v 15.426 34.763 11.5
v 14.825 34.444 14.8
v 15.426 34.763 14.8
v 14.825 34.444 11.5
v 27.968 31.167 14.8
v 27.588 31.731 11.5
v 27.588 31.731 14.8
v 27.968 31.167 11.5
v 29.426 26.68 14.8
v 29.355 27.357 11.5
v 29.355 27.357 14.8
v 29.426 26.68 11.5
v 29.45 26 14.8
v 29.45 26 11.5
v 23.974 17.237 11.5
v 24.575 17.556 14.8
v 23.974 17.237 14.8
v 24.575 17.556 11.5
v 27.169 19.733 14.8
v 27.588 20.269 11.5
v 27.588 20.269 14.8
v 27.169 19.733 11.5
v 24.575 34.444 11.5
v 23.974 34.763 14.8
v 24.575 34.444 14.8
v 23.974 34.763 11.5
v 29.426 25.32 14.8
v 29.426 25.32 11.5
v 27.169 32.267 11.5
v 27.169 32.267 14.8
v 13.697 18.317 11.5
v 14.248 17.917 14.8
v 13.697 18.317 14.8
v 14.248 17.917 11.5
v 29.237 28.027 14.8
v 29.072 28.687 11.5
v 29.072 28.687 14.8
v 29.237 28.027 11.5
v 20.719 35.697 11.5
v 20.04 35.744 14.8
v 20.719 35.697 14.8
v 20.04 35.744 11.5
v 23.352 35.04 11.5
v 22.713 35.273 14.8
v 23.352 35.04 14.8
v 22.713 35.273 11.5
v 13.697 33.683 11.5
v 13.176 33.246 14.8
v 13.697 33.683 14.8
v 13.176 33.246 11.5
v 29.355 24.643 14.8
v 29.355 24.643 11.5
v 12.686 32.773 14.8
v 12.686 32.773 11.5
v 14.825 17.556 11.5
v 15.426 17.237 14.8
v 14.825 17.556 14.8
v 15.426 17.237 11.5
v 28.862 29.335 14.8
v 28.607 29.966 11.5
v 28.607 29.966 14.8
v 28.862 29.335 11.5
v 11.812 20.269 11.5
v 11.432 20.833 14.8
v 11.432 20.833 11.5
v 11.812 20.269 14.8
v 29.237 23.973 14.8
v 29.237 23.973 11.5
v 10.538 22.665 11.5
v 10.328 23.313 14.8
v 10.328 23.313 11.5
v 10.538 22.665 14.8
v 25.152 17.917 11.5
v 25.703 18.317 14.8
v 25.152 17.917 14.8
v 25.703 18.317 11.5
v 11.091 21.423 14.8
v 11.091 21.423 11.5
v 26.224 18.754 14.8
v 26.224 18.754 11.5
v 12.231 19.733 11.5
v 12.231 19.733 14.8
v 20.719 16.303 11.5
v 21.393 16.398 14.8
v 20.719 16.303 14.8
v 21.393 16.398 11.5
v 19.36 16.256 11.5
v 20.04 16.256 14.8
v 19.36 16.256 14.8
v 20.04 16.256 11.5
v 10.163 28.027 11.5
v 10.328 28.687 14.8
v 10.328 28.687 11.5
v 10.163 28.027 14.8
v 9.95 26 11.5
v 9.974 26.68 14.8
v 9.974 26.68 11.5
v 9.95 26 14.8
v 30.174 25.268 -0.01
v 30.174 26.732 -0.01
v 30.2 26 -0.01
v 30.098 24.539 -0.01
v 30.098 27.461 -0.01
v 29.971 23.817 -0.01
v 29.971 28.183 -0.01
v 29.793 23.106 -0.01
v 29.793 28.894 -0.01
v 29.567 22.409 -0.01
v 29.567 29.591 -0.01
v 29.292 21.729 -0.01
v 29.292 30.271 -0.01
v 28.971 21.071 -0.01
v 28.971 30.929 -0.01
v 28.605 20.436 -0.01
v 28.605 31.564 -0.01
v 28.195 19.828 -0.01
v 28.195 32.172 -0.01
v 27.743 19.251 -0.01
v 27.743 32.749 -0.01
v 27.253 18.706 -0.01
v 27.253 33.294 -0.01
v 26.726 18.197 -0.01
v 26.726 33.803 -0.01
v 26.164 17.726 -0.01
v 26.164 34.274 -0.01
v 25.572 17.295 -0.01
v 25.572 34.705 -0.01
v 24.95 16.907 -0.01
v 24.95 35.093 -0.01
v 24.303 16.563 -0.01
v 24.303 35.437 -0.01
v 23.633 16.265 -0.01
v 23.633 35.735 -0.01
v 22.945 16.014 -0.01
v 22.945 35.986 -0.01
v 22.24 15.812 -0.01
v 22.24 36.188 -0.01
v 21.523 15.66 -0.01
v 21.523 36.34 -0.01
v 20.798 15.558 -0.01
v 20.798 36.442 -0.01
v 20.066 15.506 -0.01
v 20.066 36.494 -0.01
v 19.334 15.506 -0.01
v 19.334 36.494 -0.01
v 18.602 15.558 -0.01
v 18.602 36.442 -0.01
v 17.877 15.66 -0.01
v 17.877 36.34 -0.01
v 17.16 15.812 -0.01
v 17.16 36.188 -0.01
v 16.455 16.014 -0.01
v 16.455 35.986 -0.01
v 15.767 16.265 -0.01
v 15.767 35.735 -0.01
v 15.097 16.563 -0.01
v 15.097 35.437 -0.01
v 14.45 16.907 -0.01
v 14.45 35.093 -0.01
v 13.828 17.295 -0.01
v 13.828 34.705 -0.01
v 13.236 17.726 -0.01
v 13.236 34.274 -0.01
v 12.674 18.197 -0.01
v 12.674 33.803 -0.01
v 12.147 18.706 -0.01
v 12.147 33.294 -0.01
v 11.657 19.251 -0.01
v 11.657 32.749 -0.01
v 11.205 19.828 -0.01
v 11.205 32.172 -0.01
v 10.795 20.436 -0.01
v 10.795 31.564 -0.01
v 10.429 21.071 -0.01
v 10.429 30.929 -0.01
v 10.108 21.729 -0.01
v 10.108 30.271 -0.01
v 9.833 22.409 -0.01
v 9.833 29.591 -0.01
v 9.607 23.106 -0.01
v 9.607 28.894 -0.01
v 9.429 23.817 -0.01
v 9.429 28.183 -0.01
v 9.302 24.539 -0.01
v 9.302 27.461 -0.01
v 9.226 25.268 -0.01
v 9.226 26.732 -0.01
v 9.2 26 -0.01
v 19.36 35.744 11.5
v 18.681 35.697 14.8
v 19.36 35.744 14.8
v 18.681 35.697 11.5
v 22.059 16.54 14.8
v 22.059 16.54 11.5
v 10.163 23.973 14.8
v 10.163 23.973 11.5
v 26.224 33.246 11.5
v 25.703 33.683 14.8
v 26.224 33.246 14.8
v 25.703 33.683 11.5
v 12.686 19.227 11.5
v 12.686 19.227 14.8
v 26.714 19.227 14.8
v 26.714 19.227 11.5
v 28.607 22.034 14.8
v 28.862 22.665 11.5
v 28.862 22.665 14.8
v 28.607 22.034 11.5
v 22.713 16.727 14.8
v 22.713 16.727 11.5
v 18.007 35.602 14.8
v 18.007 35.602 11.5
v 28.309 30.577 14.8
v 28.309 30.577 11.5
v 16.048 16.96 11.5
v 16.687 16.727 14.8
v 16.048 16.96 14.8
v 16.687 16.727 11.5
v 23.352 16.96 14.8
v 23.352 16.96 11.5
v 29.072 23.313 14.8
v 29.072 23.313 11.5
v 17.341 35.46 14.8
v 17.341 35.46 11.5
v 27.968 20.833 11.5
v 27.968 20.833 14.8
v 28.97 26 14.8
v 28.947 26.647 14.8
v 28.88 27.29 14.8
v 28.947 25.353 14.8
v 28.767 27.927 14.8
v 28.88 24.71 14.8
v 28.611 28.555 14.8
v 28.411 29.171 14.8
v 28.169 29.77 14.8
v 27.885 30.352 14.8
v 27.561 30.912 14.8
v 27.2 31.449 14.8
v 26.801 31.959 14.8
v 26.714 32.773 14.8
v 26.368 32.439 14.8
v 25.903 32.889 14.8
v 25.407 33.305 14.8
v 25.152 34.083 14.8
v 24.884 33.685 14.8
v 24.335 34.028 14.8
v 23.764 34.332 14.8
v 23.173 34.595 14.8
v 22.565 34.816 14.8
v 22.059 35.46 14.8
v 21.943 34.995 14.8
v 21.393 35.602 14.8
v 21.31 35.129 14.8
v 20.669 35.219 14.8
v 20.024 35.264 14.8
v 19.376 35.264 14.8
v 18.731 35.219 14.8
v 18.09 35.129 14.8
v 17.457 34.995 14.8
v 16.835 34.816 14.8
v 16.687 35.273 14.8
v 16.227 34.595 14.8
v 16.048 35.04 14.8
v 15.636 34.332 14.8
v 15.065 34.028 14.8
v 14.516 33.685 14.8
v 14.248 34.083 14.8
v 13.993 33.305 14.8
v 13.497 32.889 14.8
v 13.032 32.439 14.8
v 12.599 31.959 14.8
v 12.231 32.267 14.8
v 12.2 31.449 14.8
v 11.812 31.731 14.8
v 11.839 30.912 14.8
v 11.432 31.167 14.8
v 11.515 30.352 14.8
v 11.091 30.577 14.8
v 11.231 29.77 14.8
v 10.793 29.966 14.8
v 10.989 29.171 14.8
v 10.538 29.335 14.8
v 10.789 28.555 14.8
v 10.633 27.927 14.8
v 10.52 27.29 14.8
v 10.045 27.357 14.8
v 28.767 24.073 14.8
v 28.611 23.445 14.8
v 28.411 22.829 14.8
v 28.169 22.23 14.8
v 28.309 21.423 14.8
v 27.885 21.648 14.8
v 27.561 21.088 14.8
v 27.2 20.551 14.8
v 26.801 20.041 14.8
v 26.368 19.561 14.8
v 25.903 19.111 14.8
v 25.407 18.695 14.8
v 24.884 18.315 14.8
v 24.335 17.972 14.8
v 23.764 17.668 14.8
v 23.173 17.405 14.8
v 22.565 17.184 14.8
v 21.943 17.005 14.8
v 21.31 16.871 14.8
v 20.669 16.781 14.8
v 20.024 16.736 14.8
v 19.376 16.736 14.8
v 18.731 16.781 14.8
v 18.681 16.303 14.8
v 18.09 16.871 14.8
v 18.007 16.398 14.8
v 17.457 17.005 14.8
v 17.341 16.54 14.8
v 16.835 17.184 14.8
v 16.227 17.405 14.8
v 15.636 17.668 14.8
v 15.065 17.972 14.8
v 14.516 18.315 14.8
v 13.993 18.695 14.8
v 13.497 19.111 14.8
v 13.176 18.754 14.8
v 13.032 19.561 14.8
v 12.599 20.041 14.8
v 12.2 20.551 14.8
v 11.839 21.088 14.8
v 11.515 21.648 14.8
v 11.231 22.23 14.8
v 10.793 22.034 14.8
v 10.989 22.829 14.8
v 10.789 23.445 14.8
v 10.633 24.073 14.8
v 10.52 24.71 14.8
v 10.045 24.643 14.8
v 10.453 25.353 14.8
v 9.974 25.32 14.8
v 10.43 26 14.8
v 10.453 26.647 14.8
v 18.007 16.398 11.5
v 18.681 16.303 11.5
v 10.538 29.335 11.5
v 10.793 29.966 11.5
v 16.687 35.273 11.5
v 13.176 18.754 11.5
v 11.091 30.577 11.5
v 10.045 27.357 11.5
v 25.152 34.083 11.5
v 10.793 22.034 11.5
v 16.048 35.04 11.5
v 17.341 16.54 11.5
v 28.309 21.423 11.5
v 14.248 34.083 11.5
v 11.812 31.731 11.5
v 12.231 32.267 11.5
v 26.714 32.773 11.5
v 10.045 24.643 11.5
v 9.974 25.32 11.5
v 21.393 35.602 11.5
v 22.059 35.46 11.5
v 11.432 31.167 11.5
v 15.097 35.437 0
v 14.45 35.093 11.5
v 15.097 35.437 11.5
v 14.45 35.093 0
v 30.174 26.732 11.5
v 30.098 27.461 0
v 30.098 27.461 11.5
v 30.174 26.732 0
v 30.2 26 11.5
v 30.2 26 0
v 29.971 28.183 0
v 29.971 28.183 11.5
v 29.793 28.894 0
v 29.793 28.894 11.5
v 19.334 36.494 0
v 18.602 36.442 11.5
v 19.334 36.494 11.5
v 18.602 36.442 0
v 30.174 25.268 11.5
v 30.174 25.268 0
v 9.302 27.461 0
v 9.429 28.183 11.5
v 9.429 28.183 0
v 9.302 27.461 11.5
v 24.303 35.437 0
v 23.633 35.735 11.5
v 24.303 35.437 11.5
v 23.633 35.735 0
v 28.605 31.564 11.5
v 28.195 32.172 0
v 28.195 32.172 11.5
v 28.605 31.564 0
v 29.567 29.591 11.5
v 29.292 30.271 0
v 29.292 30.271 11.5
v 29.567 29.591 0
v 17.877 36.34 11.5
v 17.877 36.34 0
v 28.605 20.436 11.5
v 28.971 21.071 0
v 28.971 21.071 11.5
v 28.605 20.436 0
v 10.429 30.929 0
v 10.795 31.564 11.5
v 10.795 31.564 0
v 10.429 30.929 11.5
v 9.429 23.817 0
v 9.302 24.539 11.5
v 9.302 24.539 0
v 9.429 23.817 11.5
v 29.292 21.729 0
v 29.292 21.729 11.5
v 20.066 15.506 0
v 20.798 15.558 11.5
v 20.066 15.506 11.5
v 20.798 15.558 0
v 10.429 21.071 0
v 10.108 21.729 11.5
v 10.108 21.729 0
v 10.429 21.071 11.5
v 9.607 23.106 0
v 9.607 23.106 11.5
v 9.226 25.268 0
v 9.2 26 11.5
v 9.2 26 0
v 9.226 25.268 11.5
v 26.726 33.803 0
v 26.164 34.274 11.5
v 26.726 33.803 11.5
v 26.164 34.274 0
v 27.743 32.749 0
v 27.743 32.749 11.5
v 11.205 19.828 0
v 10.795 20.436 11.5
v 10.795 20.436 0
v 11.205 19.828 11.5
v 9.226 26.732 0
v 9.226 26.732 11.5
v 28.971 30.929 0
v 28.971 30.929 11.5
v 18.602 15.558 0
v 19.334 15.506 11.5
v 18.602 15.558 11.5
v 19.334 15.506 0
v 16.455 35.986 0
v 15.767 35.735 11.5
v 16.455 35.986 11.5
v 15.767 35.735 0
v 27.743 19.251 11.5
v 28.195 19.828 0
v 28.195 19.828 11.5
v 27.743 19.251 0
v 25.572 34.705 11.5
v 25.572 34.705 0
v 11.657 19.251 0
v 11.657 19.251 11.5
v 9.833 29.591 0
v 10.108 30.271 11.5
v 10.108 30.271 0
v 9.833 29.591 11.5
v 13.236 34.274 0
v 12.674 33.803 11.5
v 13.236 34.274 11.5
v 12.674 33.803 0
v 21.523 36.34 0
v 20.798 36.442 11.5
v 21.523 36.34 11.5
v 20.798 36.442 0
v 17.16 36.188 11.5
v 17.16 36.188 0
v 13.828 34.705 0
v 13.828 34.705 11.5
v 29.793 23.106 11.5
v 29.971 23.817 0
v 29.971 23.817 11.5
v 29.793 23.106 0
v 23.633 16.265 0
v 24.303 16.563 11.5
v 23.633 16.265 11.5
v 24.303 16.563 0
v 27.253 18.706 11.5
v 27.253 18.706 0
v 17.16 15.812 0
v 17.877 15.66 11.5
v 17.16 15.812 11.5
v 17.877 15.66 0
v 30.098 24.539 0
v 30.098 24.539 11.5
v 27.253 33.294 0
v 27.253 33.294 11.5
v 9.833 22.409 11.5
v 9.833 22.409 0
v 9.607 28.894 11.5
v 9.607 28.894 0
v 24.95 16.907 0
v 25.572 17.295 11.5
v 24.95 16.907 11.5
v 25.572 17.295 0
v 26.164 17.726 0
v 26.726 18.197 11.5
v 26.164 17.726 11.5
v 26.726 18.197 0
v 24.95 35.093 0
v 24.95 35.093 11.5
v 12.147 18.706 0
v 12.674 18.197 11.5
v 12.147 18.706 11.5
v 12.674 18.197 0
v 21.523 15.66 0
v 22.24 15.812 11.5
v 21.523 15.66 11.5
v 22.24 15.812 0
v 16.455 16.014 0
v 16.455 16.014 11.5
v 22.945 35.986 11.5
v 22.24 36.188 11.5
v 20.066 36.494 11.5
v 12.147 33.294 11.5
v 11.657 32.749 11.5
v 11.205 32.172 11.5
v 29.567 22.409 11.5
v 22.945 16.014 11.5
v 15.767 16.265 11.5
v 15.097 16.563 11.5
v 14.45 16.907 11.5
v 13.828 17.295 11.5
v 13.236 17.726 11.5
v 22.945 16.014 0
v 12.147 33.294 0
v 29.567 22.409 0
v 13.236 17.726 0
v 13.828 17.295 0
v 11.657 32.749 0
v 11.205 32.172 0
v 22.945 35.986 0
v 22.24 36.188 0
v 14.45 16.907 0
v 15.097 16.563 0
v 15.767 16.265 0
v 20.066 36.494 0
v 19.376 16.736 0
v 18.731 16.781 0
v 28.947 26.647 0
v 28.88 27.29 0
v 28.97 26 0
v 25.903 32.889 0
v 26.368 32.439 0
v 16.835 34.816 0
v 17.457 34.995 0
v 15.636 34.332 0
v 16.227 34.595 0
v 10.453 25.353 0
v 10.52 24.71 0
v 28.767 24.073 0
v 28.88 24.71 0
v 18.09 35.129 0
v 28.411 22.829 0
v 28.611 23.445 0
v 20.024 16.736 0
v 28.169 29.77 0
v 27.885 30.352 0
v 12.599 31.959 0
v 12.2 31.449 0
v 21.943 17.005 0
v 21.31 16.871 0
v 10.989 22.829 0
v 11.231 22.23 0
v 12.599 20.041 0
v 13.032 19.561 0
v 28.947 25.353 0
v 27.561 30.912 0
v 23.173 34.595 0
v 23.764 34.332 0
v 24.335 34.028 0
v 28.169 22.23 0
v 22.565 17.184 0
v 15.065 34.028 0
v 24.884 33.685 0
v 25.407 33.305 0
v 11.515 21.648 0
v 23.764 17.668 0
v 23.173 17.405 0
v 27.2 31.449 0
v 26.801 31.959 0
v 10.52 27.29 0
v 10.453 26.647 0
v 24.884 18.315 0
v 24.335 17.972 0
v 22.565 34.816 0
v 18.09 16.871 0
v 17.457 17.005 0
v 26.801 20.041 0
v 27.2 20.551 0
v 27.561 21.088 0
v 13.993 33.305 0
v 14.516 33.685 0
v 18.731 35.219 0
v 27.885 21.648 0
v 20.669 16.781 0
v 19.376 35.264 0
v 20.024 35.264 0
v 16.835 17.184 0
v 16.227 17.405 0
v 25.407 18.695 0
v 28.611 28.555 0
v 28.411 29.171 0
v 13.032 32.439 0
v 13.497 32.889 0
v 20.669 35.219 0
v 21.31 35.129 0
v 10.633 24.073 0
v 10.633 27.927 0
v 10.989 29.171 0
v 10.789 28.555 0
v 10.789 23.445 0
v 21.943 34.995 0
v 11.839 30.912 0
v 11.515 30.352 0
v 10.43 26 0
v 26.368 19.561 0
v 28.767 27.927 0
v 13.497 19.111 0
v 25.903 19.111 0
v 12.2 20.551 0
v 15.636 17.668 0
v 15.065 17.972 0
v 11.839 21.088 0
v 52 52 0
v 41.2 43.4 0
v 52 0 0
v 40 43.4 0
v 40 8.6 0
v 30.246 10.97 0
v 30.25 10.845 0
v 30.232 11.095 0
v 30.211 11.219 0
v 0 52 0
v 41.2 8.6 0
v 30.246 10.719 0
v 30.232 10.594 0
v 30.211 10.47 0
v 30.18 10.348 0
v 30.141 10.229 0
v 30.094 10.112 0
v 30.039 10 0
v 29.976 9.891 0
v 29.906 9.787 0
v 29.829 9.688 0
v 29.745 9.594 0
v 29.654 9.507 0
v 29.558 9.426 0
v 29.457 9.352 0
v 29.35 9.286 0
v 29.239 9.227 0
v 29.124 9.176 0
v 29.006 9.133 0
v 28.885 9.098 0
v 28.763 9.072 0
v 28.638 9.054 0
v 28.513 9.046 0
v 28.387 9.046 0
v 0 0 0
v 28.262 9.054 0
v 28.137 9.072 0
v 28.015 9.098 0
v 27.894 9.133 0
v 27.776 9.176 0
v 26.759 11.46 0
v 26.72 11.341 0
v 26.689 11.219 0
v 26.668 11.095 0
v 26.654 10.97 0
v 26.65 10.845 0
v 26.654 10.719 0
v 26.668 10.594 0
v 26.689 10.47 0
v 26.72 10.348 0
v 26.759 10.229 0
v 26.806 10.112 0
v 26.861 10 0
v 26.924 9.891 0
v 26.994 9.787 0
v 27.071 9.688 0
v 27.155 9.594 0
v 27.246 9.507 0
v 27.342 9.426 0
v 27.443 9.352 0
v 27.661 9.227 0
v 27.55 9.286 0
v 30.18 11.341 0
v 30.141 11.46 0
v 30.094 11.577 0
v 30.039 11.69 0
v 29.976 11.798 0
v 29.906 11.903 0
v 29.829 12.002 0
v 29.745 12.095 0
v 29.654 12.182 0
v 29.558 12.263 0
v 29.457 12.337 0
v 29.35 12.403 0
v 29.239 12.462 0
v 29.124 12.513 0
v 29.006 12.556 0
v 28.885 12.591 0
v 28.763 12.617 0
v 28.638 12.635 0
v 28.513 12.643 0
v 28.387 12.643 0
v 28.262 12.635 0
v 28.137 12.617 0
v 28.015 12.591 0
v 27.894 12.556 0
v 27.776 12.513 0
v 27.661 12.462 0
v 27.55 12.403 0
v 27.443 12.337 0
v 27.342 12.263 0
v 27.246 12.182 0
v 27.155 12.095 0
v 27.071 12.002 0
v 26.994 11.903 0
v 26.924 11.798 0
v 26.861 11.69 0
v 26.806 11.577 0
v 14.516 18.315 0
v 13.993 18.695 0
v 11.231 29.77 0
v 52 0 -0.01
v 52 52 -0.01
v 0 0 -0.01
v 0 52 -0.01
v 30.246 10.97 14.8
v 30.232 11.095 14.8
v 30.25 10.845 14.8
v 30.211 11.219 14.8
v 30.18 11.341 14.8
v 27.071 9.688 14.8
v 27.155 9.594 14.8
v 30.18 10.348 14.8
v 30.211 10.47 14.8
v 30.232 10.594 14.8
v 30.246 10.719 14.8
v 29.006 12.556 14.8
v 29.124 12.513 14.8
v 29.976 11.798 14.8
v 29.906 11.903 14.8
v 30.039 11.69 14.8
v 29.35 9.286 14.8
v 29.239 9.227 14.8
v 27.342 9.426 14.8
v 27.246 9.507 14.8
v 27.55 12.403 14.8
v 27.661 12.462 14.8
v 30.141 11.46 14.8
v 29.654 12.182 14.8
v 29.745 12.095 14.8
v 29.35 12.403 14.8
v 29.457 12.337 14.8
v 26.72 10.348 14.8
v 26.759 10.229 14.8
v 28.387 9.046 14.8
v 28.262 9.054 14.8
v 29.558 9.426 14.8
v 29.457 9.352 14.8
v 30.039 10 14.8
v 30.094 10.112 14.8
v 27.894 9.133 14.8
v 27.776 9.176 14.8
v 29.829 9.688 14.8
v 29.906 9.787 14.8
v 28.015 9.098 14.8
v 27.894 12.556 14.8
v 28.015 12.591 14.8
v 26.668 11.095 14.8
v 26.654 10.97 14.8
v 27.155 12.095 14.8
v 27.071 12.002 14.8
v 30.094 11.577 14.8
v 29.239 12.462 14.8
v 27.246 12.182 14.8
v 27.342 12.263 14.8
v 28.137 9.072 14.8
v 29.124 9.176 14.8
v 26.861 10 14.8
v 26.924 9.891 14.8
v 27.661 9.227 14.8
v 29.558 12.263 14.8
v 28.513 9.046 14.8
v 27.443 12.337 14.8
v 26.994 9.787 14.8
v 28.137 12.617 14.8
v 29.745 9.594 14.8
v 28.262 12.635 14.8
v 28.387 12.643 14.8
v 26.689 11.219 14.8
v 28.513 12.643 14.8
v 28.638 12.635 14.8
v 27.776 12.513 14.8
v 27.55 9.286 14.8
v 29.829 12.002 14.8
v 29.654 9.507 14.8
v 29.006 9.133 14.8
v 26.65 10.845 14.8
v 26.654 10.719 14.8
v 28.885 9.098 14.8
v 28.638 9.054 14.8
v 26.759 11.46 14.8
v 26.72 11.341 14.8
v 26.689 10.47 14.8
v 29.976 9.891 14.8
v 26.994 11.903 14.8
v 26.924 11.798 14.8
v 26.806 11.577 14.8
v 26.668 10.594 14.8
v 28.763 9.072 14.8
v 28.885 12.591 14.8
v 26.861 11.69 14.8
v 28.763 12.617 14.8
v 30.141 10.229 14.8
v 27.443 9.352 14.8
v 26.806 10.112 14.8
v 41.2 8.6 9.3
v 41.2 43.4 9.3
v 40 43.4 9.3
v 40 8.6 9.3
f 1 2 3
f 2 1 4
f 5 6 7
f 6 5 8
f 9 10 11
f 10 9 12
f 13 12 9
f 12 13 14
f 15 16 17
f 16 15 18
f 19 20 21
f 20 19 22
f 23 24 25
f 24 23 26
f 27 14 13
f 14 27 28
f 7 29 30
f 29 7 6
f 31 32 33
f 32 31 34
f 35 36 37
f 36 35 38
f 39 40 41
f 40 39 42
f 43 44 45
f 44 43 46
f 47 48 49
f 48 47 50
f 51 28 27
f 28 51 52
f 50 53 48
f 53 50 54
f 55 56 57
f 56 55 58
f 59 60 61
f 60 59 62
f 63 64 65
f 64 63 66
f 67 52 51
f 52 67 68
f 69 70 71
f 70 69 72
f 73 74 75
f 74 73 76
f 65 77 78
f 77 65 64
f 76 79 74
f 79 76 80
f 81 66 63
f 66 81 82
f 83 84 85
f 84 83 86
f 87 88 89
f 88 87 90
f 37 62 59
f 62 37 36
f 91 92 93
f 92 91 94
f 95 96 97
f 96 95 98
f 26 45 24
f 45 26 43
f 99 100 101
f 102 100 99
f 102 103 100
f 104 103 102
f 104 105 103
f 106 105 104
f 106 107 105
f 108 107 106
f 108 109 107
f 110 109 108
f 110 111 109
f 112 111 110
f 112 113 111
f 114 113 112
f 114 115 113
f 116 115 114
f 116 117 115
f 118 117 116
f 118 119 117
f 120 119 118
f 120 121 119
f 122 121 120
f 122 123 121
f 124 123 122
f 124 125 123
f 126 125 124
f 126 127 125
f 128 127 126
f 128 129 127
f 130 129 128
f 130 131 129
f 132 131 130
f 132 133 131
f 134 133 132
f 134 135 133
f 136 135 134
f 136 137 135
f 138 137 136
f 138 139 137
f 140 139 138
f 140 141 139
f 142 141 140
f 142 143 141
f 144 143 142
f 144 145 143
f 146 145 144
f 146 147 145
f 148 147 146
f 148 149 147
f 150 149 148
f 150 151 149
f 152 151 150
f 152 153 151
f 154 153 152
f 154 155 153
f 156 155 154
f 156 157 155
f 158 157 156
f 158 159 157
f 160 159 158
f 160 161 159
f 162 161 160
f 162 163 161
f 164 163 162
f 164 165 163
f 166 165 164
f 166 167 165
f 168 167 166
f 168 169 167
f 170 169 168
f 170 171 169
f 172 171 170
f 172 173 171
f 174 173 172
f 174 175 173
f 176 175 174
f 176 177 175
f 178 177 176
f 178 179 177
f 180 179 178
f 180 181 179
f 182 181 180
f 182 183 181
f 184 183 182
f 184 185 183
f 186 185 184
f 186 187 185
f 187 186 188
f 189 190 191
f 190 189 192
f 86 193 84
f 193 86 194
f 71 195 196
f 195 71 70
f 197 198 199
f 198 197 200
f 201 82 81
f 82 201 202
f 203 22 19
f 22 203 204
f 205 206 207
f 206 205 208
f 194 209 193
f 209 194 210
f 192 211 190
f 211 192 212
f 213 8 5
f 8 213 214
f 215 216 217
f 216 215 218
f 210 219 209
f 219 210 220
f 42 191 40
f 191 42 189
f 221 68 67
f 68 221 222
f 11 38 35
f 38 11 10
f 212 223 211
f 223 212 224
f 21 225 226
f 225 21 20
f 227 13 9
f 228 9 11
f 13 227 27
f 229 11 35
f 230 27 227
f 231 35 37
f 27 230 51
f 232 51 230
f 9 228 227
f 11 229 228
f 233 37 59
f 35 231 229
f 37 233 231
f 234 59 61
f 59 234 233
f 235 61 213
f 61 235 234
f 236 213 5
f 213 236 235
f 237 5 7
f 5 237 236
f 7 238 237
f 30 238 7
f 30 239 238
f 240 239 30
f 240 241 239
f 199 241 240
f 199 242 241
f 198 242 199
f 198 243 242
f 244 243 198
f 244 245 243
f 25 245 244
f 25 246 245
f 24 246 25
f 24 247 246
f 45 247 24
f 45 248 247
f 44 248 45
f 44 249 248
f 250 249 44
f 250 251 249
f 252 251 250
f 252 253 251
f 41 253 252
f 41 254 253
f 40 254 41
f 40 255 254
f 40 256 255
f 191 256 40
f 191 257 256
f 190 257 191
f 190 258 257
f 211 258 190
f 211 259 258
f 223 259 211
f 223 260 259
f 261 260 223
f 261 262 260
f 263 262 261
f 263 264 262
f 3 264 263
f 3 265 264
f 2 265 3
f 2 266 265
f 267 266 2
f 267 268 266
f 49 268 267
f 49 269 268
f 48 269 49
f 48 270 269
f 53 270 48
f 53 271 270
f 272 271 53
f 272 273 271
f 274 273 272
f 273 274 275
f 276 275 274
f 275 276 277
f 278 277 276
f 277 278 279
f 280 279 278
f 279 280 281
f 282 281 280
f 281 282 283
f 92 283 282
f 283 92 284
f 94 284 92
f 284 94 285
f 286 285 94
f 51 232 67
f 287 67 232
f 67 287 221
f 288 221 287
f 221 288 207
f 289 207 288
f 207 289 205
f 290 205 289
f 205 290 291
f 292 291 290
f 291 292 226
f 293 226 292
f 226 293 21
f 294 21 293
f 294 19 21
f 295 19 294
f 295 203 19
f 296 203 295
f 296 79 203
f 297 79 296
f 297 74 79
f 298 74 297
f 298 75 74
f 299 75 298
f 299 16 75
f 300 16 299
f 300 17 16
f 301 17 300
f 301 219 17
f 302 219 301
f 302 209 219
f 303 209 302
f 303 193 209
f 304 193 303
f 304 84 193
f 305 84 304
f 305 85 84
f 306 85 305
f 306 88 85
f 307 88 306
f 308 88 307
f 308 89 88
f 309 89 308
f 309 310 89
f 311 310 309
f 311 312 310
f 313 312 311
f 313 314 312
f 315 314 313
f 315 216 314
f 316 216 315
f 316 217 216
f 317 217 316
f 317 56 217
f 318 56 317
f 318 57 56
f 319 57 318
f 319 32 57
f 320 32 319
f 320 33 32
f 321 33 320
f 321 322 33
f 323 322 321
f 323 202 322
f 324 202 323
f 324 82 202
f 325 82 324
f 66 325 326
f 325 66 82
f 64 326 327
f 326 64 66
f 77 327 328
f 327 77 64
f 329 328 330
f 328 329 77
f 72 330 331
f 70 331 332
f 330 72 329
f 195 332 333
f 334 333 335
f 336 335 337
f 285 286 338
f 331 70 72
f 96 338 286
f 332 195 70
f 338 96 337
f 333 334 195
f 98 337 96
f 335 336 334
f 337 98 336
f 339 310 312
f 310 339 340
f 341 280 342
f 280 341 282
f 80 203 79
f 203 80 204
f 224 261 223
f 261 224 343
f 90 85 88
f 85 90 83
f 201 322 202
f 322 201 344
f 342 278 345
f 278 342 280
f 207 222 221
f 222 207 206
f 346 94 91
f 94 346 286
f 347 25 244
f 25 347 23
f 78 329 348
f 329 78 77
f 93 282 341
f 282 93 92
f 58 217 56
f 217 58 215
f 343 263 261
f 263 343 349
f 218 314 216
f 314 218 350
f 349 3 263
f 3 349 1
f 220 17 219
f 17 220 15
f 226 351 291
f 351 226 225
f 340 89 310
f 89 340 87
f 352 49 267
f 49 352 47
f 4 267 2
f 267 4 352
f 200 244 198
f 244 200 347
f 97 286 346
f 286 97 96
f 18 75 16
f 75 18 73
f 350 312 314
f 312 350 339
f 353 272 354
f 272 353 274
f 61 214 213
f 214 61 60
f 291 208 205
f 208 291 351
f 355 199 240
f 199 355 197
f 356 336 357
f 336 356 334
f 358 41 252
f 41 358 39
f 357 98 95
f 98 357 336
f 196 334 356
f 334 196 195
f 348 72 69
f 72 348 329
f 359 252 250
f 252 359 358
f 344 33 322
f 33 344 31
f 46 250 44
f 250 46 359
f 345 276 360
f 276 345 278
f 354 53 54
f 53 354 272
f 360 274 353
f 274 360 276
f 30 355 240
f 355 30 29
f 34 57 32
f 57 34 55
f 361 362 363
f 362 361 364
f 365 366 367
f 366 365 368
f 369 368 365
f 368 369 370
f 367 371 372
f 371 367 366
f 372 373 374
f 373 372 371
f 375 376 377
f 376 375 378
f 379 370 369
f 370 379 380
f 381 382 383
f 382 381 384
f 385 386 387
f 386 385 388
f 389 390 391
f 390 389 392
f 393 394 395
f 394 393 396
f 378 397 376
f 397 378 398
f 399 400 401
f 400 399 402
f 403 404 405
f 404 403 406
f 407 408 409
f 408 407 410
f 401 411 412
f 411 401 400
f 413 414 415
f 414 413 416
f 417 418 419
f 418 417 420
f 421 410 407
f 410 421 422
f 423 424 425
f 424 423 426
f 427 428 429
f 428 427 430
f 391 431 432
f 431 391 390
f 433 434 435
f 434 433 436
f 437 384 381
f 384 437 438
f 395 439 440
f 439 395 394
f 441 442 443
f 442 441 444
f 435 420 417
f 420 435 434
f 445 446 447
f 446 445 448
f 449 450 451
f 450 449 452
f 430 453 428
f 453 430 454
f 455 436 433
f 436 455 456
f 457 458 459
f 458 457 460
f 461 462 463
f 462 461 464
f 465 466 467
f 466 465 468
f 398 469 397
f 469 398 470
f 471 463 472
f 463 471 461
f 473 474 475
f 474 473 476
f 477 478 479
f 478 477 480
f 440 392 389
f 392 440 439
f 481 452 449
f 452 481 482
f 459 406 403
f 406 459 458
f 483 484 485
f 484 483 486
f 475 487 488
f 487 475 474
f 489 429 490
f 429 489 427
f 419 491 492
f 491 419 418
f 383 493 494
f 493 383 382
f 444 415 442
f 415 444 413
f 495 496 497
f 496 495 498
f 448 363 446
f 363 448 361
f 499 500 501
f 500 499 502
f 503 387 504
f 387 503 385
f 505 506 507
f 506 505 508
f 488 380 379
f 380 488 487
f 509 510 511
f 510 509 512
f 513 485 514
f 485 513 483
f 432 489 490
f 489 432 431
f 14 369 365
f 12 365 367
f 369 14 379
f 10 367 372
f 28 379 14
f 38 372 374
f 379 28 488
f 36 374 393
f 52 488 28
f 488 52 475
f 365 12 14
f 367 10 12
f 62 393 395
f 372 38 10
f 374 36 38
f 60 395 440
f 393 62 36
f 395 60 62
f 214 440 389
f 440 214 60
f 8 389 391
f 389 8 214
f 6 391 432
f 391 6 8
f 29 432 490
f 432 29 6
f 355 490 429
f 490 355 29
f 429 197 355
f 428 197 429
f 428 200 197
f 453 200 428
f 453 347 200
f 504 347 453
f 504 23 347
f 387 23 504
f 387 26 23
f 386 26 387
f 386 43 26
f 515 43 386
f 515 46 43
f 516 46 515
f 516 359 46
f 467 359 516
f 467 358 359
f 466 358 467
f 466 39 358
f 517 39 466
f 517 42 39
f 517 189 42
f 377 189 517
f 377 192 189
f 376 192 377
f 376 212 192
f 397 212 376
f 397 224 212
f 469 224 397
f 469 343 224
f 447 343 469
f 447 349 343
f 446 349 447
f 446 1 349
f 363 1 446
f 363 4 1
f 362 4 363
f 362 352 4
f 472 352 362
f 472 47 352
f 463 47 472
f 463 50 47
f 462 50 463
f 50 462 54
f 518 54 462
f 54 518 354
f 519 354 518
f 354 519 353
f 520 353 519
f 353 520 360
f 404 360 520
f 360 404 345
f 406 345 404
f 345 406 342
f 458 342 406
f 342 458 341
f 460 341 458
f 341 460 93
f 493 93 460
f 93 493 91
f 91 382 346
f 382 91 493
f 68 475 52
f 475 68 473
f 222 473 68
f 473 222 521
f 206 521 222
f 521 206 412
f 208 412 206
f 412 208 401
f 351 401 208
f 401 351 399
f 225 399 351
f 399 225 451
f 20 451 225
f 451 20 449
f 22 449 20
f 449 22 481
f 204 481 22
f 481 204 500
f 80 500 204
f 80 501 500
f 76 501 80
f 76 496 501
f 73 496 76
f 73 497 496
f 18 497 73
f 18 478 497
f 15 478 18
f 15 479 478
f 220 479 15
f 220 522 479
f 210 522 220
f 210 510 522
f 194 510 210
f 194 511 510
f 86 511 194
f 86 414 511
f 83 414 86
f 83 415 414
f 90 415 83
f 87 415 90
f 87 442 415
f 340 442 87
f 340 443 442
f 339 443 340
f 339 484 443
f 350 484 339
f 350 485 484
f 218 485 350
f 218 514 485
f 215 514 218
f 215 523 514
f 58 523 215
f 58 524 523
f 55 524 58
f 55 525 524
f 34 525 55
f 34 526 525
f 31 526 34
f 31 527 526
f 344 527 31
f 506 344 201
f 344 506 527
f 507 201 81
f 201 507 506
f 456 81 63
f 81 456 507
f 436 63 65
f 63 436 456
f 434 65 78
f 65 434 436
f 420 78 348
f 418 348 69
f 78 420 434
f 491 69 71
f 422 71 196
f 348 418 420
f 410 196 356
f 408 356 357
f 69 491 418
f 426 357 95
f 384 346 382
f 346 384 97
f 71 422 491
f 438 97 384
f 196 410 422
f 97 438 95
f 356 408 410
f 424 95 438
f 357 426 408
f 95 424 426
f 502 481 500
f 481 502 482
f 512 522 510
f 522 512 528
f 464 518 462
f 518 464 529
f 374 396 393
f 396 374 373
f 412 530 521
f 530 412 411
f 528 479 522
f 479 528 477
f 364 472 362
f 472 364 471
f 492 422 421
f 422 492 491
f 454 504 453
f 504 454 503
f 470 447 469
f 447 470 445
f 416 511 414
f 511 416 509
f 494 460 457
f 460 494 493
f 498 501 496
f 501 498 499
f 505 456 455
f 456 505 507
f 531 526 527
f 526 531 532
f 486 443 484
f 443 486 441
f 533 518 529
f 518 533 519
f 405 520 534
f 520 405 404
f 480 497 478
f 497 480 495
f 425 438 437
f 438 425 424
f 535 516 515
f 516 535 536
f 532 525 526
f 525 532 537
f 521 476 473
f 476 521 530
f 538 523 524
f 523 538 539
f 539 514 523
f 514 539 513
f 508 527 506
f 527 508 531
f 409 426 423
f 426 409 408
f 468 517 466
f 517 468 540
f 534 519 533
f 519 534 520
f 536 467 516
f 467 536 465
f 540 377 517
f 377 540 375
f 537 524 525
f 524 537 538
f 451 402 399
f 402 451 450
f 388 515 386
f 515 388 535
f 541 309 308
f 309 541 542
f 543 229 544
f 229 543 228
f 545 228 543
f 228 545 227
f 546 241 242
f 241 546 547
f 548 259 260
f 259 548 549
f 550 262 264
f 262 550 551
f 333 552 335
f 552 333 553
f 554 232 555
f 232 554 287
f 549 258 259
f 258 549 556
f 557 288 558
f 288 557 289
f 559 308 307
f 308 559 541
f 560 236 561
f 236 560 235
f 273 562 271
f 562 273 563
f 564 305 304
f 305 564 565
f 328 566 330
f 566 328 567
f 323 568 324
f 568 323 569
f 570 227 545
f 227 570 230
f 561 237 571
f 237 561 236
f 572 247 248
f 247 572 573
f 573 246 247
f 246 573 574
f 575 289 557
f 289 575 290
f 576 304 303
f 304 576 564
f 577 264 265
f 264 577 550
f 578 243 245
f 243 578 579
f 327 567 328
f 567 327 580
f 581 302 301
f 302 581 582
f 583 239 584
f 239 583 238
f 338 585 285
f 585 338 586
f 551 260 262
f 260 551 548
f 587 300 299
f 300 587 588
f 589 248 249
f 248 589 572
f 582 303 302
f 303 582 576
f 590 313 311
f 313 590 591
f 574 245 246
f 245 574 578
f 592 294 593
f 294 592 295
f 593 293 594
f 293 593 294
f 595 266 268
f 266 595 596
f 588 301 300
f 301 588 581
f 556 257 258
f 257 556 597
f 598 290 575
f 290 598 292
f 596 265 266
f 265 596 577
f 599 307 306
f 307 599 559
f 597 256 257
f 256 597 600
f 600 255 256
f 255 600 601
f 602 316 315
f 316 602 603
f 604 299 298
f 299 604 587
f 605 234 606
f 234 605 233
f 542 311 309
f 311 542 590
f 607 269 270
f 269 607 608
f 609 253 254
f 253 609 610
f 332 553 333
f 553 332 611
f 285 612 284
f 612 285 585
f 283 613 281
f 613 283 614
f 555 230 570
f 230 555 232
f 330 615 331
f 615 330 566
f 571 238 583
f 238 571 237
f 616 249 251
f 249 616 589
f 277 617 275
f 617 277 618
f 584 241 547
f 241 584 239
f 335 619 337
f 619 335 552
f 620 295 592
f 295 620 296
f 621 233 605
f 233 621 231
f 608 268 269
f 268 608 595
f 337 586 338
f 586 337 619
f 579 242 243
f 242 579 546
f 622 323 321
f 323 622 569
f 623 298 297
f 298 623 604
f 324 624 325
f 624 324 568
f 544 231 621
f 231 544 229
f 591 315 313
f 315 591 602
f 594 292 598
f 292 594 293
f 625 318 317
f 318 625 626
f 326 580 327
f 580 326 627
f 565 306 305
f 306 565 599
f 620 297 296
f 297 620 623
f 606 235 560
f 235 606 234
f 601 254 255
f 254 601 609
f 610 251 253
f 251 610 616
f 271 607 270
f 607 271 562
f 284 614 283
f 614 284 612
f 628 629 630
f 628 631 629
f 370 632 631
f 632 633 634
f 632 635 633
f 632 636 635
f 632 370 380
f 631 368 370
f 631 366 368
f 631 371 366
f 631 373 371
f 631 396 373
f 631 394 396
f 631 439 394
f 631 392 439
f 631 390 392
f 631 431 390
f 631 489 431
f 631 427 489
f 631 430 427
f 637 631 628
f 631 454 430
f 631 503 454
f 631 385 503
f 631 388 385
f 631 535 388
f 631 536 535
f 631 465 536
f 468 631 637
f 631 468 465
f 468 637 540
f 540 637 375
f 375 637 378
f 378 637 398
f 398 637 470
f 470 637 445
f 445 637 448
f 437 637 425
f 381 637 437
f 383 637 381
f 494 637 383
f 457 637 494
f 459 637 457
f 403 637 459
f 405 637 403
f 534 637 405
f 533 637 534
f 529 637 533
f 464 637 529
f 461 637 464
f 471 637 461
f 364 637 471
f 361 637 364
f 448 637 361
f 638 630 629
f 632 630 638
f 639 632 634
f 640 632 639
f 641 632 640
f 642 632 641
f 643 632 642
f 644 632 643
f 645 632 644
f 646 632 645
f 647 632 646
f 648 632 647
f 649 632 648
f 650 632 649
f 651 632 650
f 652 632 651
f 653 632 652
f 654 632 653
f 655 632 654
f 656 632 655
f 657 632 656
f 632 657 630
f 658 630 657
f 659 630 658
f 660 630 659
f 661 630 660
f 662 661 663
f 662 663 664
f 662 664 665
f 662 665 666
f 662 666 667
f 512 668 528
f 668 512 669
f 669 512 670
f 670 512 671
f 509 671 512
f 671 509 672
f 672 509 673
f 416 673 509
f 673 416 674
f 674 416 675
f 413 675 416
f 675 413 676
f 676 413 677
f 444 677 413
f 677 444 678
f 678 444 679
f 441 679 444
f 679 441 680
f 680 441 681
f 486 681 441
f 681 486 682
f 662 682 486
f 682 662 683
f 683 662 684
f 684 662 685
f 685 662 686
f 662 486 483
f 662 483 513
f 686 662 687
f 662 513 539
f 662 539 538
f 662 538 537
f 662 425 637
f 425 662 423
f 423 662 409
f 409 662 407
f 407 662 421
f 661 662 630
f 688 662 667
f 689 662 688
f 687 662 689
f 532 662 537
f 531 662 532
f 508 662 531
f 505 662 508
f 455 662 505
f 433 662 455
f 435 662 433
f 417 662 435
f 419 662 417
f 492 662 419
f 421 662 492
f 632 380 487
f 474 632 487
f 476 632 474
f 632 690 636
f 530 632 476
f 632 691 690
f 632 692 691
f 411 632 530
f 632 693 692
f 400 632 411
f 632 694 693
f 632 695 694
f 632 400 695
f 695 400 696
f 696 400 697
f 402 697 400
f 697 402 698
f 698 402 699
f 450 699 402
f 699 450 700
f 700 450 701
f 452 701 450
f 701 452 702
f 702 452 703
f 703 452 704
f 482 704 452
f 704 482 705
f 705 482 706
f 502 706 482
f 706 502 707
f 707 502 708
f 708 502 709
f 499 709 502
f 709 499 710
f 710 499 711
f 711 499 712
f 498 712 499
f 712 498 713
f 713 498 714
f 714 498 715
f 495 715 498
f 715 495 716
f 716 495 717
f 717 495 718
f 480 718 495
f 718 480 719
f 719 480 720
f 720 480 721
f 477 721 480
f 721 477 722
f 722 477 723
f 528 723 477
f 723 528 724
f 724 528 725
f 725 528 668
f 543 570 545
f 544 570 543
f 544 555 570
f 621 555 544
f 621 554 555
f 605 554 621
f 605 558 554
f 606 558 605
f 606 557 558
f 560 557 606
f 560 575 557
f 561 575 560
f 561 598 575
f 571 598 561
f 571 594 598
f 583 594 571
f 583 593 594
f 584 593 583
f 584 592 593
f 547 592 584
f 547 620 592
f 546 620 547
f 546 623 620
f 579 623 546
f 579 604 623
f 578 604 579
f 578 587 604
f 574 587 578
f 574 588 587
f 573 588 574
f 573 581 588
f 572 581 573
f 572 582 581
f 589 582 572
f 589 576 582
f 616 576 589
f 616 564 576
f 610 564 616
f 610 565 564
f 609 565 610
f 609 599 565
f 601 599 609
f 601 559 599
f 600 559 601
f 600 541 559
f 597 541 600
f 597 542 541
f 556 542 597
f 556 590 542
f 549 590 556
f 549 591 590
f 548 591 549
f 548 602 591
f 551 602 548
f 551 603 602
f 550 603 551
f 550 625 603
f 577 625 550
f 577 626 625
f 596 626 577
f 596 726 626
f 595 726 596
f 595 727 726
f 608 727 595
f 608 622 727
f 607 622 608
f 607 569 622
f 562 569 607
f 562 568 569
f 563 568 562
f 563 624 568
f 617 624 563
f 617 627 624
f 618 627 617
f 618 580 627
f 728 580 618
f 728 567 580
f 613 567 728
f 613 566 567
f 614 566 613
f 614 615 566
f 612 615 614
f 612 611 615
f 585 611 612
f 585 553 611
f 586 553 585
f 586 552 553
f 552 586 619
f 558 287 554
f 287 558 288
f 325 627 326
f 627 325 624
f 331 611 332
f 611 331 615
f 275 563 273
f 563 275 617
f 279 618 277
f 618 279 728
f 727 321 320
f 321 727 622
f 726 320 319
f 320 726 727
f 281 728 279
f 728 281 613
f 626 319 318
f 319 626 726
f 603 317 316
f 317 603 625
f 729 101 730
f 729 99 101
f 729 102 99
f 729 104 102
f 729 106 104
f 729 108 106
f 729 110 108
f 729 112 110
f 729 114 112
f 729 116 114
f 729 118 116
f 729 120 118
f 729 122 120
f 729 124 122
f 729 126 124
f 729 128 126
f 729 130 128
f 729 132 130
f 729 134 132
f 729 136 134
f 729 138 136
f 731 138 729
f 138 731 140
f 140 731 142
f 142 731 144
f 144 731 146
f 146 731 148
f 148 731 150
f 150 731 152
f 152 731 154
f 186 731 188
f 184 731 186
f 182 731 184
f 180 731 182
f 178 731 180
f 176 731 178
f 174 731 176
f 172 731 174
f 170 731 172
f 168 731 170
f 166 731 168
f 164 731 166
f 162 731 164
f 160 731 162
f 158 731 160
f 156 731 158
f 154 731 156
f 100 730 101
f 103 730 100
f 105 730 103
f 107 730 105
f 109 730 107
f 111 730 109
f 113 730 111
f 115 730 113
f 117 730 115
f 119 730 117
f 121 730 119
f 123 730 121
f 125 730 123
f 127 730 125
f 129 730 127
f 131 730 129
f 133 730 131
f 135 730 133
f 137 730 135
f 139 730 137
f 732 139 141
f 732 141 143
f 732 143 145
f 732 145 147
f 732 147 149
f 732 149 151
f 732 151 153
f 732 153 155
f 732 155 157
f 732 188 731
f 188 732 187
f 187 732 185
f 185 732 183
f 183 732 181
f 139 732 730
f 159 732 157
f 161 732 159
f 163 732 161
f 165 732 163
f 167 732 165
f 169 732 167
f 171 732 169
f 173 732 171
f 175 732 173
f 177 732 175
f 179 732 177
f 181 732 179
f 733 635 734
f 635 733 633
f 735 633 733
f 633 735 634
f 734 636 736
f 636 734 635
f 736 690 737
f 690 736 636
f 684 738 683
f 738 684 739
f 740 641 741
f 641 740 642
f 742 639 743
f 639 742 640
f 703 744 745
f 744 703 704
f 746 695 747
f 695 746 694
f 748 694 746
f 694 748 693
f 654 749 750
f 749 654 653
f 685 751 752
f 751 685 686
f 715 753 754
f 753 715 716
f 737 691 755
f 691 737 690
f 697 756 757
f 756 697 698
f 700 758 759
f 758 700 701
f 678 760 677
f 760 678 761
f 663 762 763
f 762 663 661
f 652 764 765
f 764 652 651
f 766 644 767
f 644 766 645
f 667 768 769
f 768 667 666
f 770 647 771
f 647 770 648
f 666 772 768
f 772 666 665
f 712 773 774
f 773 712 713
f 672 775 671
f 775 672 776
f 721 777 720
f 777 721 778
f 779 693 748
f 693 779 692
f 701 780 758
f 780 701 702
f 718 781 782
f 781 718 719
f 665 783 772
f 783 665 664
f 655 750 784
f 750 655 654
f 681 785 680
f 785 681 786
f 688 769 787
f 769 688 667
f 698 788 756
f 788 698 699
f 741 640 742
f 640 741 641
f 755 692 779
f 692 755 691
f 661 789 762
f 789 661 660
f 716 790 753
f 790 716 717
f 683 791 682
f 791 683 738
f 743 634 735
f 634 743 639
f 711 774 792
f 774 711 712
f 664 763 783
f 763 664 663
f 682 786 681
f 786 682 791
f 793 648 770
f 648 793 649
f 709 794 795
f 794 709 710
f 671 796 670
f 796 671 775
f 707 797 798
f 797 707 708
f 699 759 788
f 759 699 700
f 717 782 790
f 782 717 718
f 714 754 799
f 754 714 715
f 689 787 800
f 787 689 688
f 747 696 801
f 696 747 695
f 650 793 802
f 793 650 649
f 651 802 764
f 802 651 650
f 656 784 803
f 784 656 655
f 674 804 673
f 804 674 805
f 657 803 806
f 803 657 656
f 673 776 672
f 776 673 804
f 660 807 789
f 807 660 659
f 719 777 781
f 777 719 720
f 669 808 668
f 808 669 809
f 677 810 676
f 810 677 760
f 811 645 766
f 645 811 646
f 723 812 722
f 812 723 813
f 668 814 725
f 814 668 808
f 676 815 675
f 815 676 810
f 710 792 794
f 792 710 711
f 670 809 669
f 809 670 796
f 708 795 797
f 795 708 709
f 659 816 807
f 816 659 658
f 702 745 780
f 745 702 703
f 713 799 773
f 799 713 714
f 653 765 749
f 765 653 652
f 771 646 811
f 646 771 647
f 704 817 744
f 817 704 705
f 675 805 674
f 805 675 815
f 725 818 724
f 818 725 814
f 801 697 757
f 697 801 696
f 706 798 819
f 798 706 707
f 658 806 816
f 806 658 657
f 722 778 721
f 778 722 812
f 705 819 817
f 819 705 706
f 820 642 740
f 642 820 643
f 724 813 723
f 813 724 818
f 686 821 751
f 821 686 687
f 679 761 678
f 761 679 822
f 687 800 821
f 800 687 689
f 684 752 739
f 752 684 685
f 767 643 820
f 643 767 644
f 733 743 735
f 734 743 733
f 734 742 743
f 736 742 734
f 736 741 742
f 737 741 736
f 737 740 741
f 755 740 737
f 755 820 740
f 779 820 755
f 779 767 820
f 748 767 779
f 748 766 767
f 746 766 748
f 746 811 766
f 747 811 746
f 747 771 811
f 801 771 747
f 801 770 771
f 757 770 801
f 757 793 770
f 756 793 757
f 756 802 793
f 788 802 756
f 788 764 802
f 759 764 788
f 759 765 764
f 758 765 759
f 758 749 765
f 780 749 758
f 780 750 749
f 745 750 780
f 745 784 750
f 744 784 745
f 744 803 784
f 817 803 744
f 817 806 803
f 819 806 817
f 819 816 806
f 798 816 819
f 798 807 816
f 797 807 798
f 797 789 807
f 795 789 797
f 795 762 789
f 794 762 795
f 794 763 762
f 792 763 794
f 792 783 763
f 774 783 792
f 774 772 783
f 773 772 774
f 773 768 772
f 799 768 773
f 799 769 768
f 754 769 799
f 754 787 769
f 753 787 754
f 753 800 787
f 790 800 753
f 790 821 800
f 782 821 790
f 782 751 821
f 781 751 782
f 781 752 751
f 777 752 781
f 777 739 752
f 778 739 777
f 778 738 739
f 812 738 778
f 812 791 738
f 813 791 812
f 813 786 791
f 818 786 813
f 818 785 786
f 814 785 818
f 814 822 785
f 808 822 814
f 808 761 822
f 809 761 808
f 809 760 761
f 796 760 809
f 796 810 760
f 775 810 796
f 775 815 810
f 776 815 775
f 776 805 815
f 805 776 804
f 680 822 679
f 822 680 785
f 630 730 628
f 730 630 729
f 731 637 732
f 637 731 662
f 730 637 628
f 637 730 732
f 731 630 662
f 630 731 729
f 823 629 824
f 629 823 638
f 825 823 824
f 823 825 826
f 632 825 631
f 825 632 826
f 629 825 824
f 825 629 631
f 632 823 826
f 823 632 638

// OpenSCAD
// file: ../Base/PlacementOptions.scad
// Fischertechnik Box Foundation
// Placement Options

// Alignment
NoAlign = 0;
AlignLeft = 1;
AlignBottom = 2;
AlignCenter = 3;
AlignRight = 4;
AlignTop = 5;

// Element rotation degree steps
rotations = [0, -90, -180, -270];

// Rotation
NoRotation = 0;
Rotate0 = 0;
Rotate90 = 1;
Rotate180 = 2;
Rotate270 = 3;

// Docking (seen from above)
NoDock = -1;
DockLeft = 0;
DockTop = 1;
DockRight = 2;
DockCorner = 2;
DockBottom = 3;

// Web corners
LowerLeft = 0;
UpperLeft = 1;
UpperRight = 2;
LowerRight = 3;

// Web position relative to corner
LeftOfCorner = 0;
RightOfCorner = 1;
// file: ../Base/Boxes.scad
// Fischertechnik Box Foundation
// Pre-designed Boxes

use <Constants.scad>

include <PlacementOptions.scad>

box190Width = 190;
box190Depth = 130;
box130Width = 130;
box130Depth = 95;
boxUsageHeight = 33.9;
boxWallThickness = 2.4;
boxBaseThickness = 1.0;
boxWebWidth = 3.0;

// getBoxWallThickness()
// Gets the wall thickness of a Fischertechnik Box

function getBoxWallThickness() = boxWallThickness;

// Gets the usable height of a fischertechnik box
function getBoxUsageHeight() = boxUsageHeight;

// Gets the thickness of the Fischertechnik box base.
function getBoxBaseThickness() = boxBaseThickness;

// Gets the width of a box web
function getBoxWebWidth() = boxWebWidth;

// Gets the usable inner space of a Box 190 as an x/y-list
function getBox190Space() = [
    box190Width - 2*getBoxWallThickness(), 
    box190Depth - 2*getBoxWallThickness() ];

// Imports the Fischertechnik empty box 130x190 mm and places it at position 0,0
// 190x130 are the outer sizes, the inner space is slightly smaller. Use getBox190Space() to get the inner sizes.
// This module needs the STL file "Fischertechnik Box 130x190.stl" in the library path.
// The box is positioned that the usable inner space is at the 0,0,0 position. The

module Box190() {
    translate([-getBoxWallThickness(),-getBoxWallThickness(),-getBoxBaseThickness()])
        import("Fischertechnik Box 130x190.stl", convexity=3);
}

// Gets the usable inner space of a Box 130 as an x/y-list
function getBox130Space() = [
    box130Width - 2*getBoxWallThickness(), 
    box130Depth - 2*getBoxWallThickness() ];

// Imports the Fischertechnik empty box 95x130 mm and places it at position 0,0
// 190x130 are the outer sizes, the inner space is slightly smaller. Use getBox190Space() to get the inner sizes.
// This module needs the STL file "Fischertechnik Box 95x130.stl" in the library path.
// The box is positioned that the usable inner space is at the 0,0,0 position. The

module Box130() {
    translate([-getBoxWallThickness(),-getBoxWallThickness(),-getBoxBaseThickness()])
        import("Fischertechnik Box 95x130.stl", convexity=3);
}

// Creates a web at the specified box walls
// corner 0 = LowerLeft, 1 = UpperLeft, 2 = UpperRight, 3 = LowerRight
// side 0 = LeftOfCorner, 1 = RightOfCorner
// distance = Distance in mm from the corner
// box = inner width and depth of the box (default: Box 190)
// webWidth = length of the web (default is 3 mms)
// webThickness = thickness of the web (default is 1 mm)

module BoxWeb(corner, side, distance, box=getBox190Space(), webWidth=getBoxWebWidth(), webThickness=1.0) {
    sink = getBoxWallThickness()/2;

    width = (corner % 2 == 0) ? 
            (side == LeftOfCorner ? webWidth : webThickness) :
            (side == LeftOfCorner ? webThickness : webWidth);

    depth = (corner % 2 == 0) ? 
            (side == RightOfCorner ? webWidth : webThickness) :
            (side == RightOfCorner ? webThickness : webWidth);
    
    xDiff = corner == LowerLeft ? 
                (side == LeftOfCorner ? -sink : distance) :
            (corner == UpperLeft ?                
                (side == LeftOfCorner ? distance : -sink) :
            (corner == UpperRight ?
                (side == LeftOfCorner ? box.x-webWidth+sink : box.x-distance-webThickness) :
                (side == LeftOfCorner ? box.x-distance-webThickness: box.x-webWidth+sink)));

    yDiff = corner == LowerLeft ? 
                (side == RightOfCorner ? -sink : distance) :
            (corner == UpperLeft ?
                (side == RightOfCorner ? box.y-distance : box.y-webWidth+sink) :
            (corner == UpperRight ?
                (side == RightOfCorner ? box.y-webWidth+sink : box.y-distance) :
                (side == RightOfCorner ? distance : -sink)));
    
    translate([xDiff, yDiff, -getExcess()])
        cube([width, depth, boxUsageHeight + 2*getExcess()]);
}
// file: ../Base/Rotation.scad
// Fischertechnik Box Foundation
// Geometry Helpers Rotation

include <PlacementOptions.scad>

// getRotatedSpace(space, rotation=NoRotation)
// Rotates the space dependent on the specified rotation

function getRotatedSpace(space, rotation=NoRotation) = [
    (rotation == Rotate90 || rotation == Rotate270) ? space.y : space.x,
    (rotation == Rotate90 || rotation == Rotate270) ? space.x : space.y
];

// Rotates the given space around the fixed left lower corner
// space = the space the children needs as width/depth list [width,depth]
// rotation = 0 Rotate0 degrees, 1 Rotate90 degrees, 2 Rotate180 degrees, 3 Rotate270 degrees (equivalent to -90)

module RotateFix(space, rotation=NoRotation) {
    dy = (rotation == Rotate0 || rotation == Rotate270) ? 0 :
        (rotation == Rotate90) ? space.x :
        space.y;
    dx = (rotation < Rotate180) ? 0 :
        (rotation == Rotate180) ? space.x :
        space.y;
    
    translate([dx, dy, 0])
        rotate([0, 0, rotations[rotation]])
            children();
}
// file: ../Base/Alignment.scad
// Fischertechnik Box Foundation
// Geometry Helpers Alignment

include <PlacementOptions.scad>

// getAlignedX(elementWidth, spaceWidth, align=AlignRight, offset=0)
// Gets the aligned X offset of an element with the given
// width in the given space.
// elementWidth = The width of the element to positon
// spaceWidth = The space where the element should be aligned
// align = 0 AlignLeft, 1 AlignCenter, 2 AlignRight
// offset = an optional offset from the aligned position. When
// aligned left or centered, then positive values are in X direction.
// When aligned right then positive values are in negative X direction.

function getAlignedX(elementWidth, spaceWidth, align=AlignRight, offset=0) =
    (align == AlignLeft) ?
        offset :
        ((align == AlignCenter) ?
        (spaceWidth - elementWidth)/2 + offset :
        spaceWidth - offset - elementWidth);

// getAlignedY(elementDepth, spaceDepth, align=AlignTop, offset=0)
// Gets the aligned Y offset of an element with the given
// depth in the given space.
// elementDepth = The depth of the element to positon
// spaceDepth = The space where the element should be aligned
// align = 0 AlignBottom, 1 AlignCenter, 2 AlignTop
// offset = an optional offset from the aligned position. When
// aligned bottom or centered, then positive values are in Y direction.
// When aligned top then positive values are in negative Y direction.

function getAlignedY(elementDepth, spaceDepth, align=AlignTop, offset=0) =
    (align == AlignBottom) ?
        offset :
        ((align == AlignCenter) ?
        (spaceDepth - elementDepth)/2 + offset :
        spaceDepth - offset - elementDepth);
// file: CylinderGearZ20.scad
// Fischertechnik Box Library
// Cylinder for Gear Z20
// 31021

use <../Base/Constants.scad>
use <../Base/Placement.scad>
use <../ModelBase/Simple.scad>

depth = 33.8;
width = 33.8;
height = 14.8;
levelHeight = 11.5;

function getCylinderGearZ20Height() = height;
function getCylinderGearZ20LevelHeight() = levelHeight;

// getCylinderGearZ20Space()
// Gets the space the cylinder gear needs as width and depth (.x and .y as a list)

function getCylinderGearZ20Space() = [width, depth];

// CylinderGear()
// Standing cylinder for gear wheel Z20

module CylinderGearZ20() {
    diameter = getHubRingDiameter();
    levelDiameter = getHubRingLevelDiameter();

    Space(getCylinderGearZ20Space());
        
    Center(getCylinderGearZ20Space())
        LeveledTube(getCylinderGearZ20Height(), diameter, getCylinderGearZ20LevelHeight(), levelDiameter);
}

// Tests
color("lightgray")
CylinderGearZ20();
// file: ../Base/Placement.scad
// Fischertechnik Box Foundation
// Geometry Helpers Placement

use <Constants.scad>
use <Alignment.scad>
use <Rotation.scad>
use <Boxes.scad>

include <PlacementOptions.scad>

// Place(x=0, y=0, elementSpace=[0,0], alignX=AlignLeft, alignY=AlignBottom, rotation=Rotate0, boxSpace=getBox190Space())
// Places the child at the specified position
// y = Y-Position. This is a relative position when an X aligment is specified.
// x = X-Position. This is a relative position when an Y aligment is specified.
// elementSpace = space of the element to be placed [x,y]
// alignX = -1=NoAlign, 0 AlignLeft, 1 AlignCenter, 3 AlignRight (elementSpace and boxSpace required!)
// alignY = -1=NoAlign, 2 AlignBottom, 1 AlignCenter, 4 AlignTop (elementSpace and boxSpace required!)
// rotation = 0 Rotate0 0 degrees, 1 Rotate90 90 degrees, 
// 2 Rotate180 180 degrees, 3 Rotate270 270 degrees (equivalent to -90)
// boxSpace = Inner space of the box where the placement occurs [x,y] - default is Box 190x130 inner space

module Place(x=0, y=0, elementSpace=[0,0], 
  alignX=AlignLeft, alignY=AlignBottom, 
  rotation=NoRotation, boxSpace=getBox190Space()) {

    module Position(x, y, space, rotation=Rotate0) {
        translate([x, y, 0])
            RotateFix(space, rotation)
                children();
    }

    space = getRotatedSpace(elementSpace, rotation);
    alignedX = getAlignedX(space.x, boxSpace.x, alignX, x);
    alignedY = getAlignedY(space.y, boxSpace.y, alignY, y);
    Position(alignedX, alignedY, elementSpace, rotation)
        children();
}

// Center(space=getBox130Space(), elementSpace=[0,0])
// space = Space where the children is centered. For cylinder use centered=true and no elementSpace.
// elementSpace = space of the element to be centered [x,y]

module Center(space=getBox190Space(), elementSpace=[0,0]) {
    translate([(space.x - elementSpace.x) / 2, (space.y - elementSpace.y) / 2])
        children(0);
}

// CenterHorizontal(width=0, y=0, offset=0, space=getBox130Space())
// space = Space where the children is centered. For cylinder use centered=true and no elementSpace.
// elementSpace = space of the element to be centered [x,y]

module CenterHorizontal(width=0, y=0, offset=0, space=getBox190Space()) {
    translate([(space.x - width) / 2 + offset, y])
        children(0);
}

// CenterVertical(depth=0, x=0, offset=0, space=getBox130Space())
// space = Space where the children is centered. For cylinder use centered=true and no elementSpace.
// elementSpace = space of the element to be centered [x,y]

module CenterVertical(depth=0, x=0, offset=0, space=getBox190Space()) {
    translate([x, (space.y - depth) / 2 + offset])
        children(0);
}
// file: ../Base/Constants.scad
// Fischertechnik Box Foundation
// Constants

// Constant values necessary for multiple elements

// Base constants
dividerThickness = 1.2;
excess = 0.01;
fragments = 90;
tolerance = 0.8;

// Gets the thickness of a divider 
function getDividerThickness() = dividerThickness;

// Gets the excess that is used to merge walls into each other
function getExcess() = excess;

// Gets amount of fragments of a cylinder
function getFragments() = fragments;

// Gets the inner tolerance of a frame to each side
function getTolerance() = tolerance;


// Fischertechnik specific constants
axisDiameter = 4;
axisBottomDiameter = axisDiameter + 1;
axisTolerance = 0.2;
axisLockingLength = 8;

// Gets axis diameter of Fischertechnik axis
function getAxisDiameter() = axisDiameter;

// Gets axis diameter tolerance (subtracted for element axis)
function getAxisTolerance() = axisTolerance;

// Gets the axis diameter for standing axis
function getStandAxisDiameter() = getAxisDiameter() - getAxisTolerance();

// Gets axis bottom diameter for thicker part at the bottom
function getAxisBottomDiameter() = axisBottomDiameter;

// Gets the lengthh of the locking part of a locking axis
function getAxisLockingLength() = axisLockingLength;

// Studs

studHeight = 2.5;
studTolerance = 0.2;
studRailDistance = 9;   // as in ft 50

// gets the height of a connecting stud
function getStudHeight() = studHeight;

// gets the connecting stud height tolerance
function getStudTolerance() = studTolerance;

// gets the default rail distance for studs
function getStudRailDistance() = studRailDistance;

// Dockable Frame with Edge

standardEdgeDistance = 2.5;
standardWebDistance = 11.5;
standardCornerLength = 15;

// gets the standard distance to the wall of the box for dockable frames with webs
function getStandardEdgeDistance() = standardEdgeDistance;

// gets the standard distance of each web to the corner of the dockable frame
function getStandardWebDistance() = standardWebDistance;

// gets the standard length of the corner walls of a dockable frame
function getStandardCornerLength() = standardCornerLength;

// Tubes

tubeWallFactor = 0.8;

// gets the wall thickness of a tube.
function getTubeWallThickness() = tubeWallFactor * getDividerThickness();

// Small Parts and Divider Frame

smallPartsFrameHeight = 20;

// gets the frame height for docked small parts boxes.
function getSmallPartsFrameHeight() = smallPartsFrameHeight;

// Hubs

hubRingDiameter = 19.5;
hubRingLevelDiameter = 21;

// gets the diameter of a tube matching the inner ring of a wheel
function getHubRingDiameter() = hubRingDiameter;

// gets the diameter of a hub tube with a thicker diameter
function getHubRingLevelDiameter() = hubRingLevelDiameter;

// Struts

strutAddLength = 9.0;
strutDepth = 8.0;
strutThickness = 2.8;
strutOuterTolerance = 0.6;

// gets the full length of a strut (nominal length plus 2x radius at the ends)
function getFullStrutLength(length) = length + strutAddLength;

// gets the radius of the end of a strut
function getStrutEndRadius() = strutAddLength / 2;

// gets the the depth (width) of a strut
function getStrutDepth() = strutDepth;

// gets the the thickness of a strut
function getStrutThickness() = strutThickness;

// gets the tolerance added to the strut sizes for strut holders
function getStrutOuterTolerance() = strutOuterTolerance;

// Propeller

propellerAxisDiameter = 7.0;
propellerAxisTolerance = 0.2;

// gets the propeller axis outer diameter
function getPropellerAxisDiameter() = propellerAxisDiameter;

// gets the propeller axis printing tolerance
function getPropellerAxisTolerance() = propellerAxisTolerance;
// main file
// Fischertechnik Box Library
// Cylinder with two axis and a web for a segment disc
// 31037

use <../Base/Constants.scad>
use <../Base/Placement.scad>
use <../ModelBase/Simple.scad>
use <../ModelBase/Complex.scad>

use <CylinderGearZ20.scad>

width = 52;
depth = 52;

function getCylinderAndAxisSegmentDiscSpace() = [width, depth];

// CylinderAndAxisSegmentDisc
// Cylinder with two axis and a web for a segment disc

module CylinderAndAxisSegmentDisc() {
    Space(getCylinderAndAxisSegmentDiscSpace());

    xOffset = 2.8;
    yOffset = (getCylinderAndAxisSegmentDiscSpace().y - getCylinderGearZ20Space().y)/2;

    axisHeight = getCylinderGearZ20Height();

    translate([xOffset, yOffset, 0]) {
        CylinderGearZ20();

        centerDistance = 17.5;
        diameter = getAxisDiameter() - 0.4;

        Center(space=getCylinderGearZ20Space()) { 
            translate([sin(150)*centerDistance, cos(150)*centerDistance])           
                Axis(axisHeight, diameter=diameter);
            translate([sin(30)*centerDistance, cos(30)*centerDistance])           
                Axis(axisHeight, diameter=diameter);
        }
    }

    webHeight = 9.3;
    webOffset = 40;
    webDepth = 34.8;
    webVolume = [getDividerThickness(), webDepth, webHeight];

    CenterVertical(depth=webDepth, x=webOffset, space=getCylinderAndAxisSegmentDiscSpace())
        Wall(webVolume);
}

// Test
color("lightgray")
CylinderAndAxisSegmentDisc();
